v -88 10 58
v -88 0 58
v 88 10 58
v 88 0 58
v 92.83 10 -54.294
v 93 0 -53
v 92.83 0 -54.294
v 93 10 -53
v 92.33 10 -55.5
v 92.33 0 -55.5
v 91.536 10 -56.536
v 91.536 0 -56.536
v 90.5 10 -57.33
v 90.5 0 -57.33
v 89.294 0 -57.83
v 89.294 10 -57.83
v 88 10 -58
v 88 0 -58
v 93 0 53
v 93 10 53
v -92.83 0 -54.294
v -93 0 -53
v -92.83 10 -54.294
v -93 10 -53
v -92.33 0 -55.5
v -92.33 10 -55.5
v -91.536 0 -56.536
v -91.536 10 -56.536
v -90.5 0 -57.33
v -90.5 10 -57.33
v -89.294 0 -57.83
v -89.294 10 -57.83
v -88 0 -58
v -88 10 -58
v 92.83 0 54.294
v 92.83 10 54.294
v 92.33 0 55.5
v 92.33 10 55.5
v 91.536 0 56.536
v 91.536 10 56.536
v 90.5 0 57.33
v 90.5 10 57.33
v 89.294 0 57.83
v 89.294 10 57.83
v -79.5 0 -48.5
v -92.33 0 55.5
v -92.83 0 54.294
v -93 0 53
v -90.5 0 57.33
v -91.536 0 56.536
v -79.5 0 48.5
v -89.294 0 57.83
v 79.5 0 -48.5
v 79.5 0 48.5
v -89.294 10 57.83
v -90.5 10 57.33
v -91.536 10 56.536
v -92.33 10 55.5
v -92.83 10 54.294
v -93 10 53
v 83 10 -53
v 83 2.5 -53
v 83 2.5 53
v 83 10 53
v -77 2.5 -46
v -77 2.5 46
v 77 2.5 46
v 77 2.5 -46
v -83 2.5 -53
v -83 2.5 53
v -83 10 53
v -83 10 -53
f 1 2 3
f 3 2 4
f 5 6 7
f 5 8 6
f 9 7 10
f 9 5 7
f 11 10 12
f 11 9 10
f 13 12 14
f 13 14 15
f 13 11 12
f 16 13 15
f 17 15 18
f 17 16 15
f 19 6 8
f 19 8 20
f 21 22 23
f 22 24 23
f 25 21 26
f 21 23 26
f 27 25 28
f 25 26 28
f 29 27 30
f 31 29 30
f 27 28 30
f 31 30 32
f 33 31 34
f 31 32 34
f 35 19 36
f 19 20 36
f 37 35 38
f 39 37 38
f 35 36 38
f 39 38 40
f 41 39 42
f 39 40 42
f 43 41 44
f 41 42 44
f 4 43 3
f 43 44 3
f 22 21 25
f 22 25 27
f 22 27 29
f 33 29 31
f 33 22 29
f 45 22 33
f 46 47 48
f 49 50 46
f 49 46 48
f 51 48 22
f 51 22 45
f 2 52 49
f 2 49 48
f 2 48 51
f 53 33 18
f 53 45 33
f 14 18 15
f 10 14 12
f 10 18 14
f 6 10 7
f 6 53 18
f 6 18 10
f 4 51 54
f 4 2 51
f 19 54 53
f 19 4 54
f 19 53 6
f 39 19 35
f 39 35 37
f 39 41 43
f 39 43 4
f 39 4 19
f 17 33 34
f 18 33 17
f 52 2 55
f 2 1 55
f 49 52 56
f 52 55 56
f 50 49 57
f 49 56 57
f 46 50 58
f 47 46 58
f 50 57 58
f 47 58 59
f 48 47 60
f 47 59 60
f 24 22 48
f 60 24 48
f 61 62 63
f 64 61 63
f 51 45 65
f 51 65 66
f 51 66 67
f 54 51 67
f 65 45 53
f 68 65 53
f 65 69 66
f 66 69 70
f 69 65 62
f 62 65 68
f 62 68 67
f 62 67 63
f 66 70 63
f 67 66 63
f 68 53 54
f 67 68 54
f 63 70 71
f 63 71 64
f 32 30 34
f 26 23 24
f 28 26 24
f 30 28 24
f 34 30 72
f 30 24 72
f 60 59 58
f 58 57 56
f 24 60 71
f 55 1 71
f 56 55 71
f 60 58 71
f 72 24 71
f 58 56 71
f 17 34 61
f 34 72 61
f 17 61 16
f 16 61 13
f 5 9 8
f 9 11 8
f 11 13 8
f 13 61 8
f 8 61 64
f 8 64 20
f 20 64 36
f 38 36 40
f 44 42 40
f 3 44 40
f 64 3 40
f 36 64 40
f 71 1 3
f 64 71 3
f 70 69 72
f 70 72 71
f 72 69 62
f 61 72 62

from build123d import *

# Parameters (mm, degrees)
F0_W     = 186
F0_H     = 116
F0_W_2   = 166
F0_H_2   = 106
F1_DEPTH = 10
F0_W_3   = 164
F0_H_3   = 102
F2_DEPTH = 2.5
F0_W_4   = 154
F0_H_4   = 92
F3_DEPTH = 2.5
F4_SIZE  = 2.49999
F5_R     = 5


# Not quite as in the source:
# - a fillet or chamfer is up to 0.001 mm smaller than in the source, because OpenCascade refuses the exact size


with BuildPart() as f1:
    # F0 (on Front) → F1 (new body)
    with BuildSketch(Plane.XZ):
        Rectangle(F0_W, F0_H)
        Rectangle(F0_W_2, F0_H_2, mode=Mode.SUBTRACT)
    extrude(amount=-F1_DEPTH)

    # F0 (on Front) → F2 (join)
    with BuildSketch(Plane.XZ):
        Rectangle(F0_W_2, F0_H_2)
        Rectangle(F0_W_3, F0_H_3, mode=Mode.SUBTRACT)
    extrude(amount=-F2_DEPTH)

    # F0 (on Front) → F3 (join)
    with BuildSketch(Plane.XZ):
        Rectangle(F0_W_3, F0_H_3)
        Rectangle(F0_W_4, F0_H_4, mode=Mode.SUBTRACT)
    extrude(amount=-F3_DEPTH)

    # F4 (size 2.5 in the source; OpenCascade refuses exactly that, so slightly less here)
    f4_edges = [f1.edges().sort_by_distance(p)[0] for p in [
        (0, 0, 46),
        (-77, 0, 0),
        (0, 0, -46),
        (77, 0, 0),
    ]]
    chamfer(f4_edges, length=F4_SIZE)

    # F5
    f5_edges = [f1.edges().sort_by_distance(p)[0] for p in [
        (-93, 5, 58),
        (-93, 5, -58),
        (93, 5, -58),
        (93, 5, 58),
    ]]
    fillet(f5_edges, radius=F5_R)


solid = f1.part
